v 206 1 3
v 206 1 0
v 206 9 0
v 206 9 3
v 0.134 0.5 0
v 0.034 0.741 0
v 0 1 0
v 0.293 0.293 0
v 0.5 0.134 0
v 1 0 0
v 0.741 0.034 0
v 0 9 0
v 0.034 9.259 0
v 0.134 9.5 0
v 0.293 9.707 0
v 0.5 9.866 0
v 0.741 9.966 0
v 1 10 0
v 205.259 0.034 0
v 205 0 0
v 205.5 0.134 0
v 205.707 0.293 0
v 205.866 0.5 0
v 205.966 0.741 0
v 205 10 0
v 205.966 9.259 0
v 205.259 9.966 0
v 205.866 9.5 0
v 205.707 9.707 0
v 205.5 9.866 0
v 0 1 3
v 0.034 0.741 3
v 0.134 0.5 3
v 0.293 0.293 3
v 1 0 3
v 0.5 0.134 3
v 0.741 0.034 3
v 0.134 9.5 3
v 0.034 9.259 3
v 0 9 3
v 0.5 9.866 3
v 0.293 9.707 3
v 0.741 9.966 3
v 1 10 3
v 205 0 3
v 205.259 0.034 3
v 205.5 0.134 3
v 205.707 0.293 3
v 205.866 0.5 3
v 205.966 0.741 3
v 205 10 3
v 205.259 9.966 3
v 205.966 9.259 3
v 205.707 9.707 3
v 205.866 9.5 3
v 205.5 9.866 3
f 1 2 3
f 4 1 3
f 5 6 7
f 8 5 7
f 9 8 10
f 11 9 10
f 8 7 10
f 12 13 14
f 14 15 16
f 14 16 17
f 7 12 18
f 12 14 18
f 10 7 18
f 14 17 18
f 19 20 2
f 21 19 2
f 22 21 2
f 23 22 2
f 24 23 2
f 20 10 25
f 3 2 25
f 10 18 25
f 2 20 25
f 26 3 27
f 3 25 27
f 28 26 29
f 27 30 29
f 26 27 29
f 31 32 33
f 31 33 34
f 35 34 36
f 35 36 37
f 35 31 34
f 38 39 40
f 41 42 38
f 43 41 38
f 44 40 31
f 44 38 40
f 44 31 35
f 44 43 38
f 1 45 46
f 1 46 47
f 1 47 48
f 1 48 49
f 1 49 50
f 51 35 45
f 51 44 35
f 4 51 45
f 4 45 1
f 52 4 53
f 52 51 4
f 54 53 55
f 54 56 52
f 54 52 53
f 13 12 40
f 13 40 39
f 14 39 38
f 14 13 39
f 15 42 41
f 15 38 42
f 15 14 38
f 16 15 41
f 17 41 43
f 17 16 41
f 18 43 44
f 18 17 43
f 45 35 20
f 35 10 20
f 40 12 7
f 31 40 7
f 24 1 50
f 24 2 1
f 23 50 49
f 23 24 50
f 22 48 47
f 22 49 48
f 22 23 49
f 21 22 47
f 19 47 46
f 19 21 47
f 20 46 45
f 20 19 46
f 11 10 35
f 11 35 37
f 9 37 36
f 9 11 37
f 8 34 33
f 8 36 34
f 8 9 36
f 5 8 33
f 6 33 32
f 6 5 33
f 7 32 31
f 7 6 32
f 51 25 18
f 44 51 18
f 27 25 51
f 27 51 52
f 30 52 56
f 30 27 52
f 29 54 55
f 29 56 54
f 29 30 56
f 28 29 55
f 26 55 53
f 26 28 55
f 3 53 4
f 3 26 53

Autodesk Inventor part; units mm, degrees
ref_plane "YZ Plane" through (0, 0, 0) normal (1, 0, 0) x (0, 1, 0)
ref_plane "XZ Plane" through (0, 0, 0) normal (0, 1, 0) x (-1, 0, 0)
ref_plane "XY Plane" through (0, 0, 0) normal (0, 0, 1) x (1, 0, 0)
sketch "Sketch1" plane through (0, 0, 0) normal (0, 0, 1) x (1, 0, 0)
  line L0 (1, 0) -> (205, 0)
  line L1 (206, 1) -> (206, 9)
  line L2 (205, 10) -> (1, 10)
  line L3 (0, 9) -> (0, 1)
  arc A0 (205, 0) -> (206, 1) centre (205, 1) ccw
  arc A1 (206, 9) -> (205, 10) centre (205, 9) ccw
  arc A2 (1, 10) -> (0, 9) centre (1, 9) ccw
  arc A3 (0, 1) -> (1, 0) centre (1, 1) ccw
  point P0 (0, 0)
  point P1 (206, 10)
  point P2 (0, 10)
  dimension "d0" = 10
  dimension "d1" = 206
  dimension "d2" = 1
  dimension "d5" = 1
extrude "Extrusion1" add sketch "Sketch1" along normal blind 3
properties part number "OpenROV 2_3 Dev Bulkhead Brace"
